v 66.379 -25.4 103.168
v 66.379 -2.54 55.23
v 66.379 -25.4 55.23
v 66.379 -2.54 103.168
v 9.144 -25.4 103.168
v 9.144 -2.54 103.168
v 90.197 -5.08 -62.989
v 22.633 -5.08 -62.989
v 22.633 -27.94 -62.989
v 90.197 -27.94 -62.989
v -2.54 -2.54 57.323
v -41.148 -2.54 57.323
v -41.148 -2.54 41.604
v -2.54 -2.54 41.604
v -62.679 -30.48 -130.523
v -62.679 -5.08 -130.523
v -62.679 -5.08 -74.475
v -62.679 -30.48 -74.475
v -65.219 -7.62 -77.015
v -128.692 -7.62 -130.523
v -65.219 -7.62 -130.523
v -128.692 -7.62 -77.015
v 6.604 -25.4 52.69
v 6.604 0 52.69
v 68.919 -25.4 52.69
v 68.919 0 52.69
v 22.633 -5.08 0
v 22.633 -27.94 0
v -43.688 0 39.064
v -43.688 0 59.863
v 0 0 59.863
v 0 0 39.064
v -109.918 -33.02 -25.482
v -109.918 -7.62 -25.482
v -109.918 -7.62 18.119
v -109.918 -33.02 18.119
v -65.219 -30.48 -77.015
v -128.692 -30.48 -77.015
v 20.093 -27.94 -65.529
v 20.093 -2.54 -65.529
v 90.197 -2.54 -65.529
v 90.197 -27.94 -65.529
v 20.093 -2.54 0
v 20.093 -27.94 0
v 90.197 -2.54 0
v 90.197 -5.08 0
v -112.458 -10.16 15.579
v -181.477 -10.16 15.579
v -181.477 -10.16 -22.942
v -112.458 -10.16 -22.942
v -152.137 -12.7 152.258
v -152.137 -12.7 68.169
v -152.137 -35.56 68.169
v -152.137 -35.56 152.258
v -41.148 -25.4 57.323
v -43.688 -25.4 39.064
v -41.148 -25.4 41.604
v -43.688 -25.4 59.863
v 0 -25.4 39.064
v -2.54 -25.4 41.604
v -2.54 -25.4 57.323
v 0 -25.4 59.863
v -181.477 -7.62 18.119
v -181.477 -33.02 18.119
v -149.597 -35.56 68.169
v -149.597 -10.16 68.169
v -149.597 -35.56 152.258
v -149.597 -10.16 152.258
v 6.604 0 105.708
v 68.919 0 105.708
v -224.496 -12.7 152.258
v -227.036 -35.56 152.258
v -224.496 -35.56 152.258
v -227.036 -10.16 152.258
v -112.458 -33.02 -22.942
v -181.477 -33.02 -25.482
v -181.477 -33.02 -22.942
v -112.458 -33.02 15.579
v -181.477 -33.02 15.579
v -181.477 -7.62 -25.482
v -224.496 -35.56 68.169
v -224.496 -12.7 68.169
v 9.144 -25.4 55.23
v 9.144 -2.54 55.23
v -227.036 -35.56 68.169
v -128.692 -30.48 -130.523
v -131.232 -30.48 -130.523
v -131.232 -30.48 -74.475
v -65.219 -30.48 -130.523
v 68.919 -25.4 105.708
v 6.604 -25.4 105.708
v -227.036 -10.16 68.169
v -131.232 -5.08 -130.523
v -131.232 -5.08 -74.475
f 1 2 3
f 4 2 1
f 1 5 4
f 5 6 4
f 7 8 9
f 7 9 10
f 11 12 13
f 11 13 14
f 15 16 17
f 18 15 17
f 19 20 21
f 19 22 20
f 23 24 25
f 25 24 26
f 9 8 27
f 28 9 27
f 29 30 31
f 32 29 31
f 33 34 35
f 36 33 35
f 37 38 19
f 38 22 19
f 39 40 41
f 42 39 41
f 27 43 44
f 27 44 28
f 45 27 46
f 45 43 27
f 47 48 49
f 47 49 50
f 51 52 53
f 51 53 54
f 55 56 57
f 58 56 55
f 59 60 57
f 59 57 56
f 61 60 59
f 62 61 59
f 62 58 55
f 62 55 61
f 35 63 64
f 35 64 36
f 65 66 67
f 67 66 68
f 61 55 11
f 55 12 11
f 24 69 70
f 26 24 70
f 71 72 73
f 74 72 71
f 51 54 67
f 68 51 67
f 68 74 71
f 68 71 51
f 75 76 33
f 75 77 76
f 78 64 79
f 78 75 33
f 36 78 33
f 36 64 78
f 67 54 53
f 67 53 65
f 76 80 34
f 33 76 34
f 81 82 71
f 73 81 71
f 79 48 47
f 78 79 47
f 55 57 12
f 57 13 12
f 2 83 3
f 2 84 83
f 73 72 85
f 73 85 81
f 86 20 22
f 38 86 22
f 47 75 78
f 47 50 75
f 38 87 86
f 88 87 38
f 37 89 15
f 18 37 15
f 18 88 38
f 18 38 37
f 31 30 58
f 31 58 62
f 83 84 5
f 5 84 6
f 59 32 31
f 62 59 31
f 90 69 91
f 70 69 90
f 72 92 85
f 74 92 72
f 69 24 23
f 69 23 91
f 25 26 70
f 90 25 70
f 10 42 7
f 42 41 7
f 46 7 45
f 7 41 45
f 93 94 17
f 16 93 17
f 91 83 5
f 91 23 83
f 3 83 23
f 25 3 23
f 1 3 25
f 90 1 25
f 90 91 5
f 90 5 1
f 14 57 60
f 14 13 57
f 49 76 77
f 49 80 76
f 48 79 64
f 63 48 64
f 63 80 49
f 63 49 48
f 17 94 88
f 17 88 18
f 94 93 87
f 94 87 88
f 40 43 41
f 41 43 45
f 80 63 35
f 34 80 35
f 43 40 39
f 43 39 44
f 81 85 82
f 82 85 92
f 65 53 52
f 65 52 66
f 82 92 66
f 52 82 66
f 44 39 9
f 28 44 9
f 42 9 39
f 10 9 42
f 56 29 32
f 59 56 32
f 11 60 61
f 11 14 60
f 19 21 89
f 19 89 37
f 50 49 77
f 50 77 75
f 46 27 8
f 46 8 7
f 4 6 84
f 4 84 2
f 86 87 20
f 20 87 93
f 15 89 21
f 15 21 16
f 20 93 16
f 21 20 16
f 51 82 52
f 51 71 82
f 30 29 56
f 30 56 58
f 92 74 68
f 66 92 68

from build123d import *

# Parameters (mm, degrees)
F0_W      = 43.6879917979
F0_H      = 20.799420774
F1_DEPTH  = 25.4
F0_W_2    = 62.3146742582
F0_H_2    = 53.0174635351
F11_T     = -2.54
F11_2_T   = -2.54
F2_W      = 70.1040774584
F2_H      = 65.5285418034
F3_DEPTH  = 25.4
F4_T      = -2.54
F5_W      = 68.5530081391
F5_H      = 56.0477301478
F6_DEPTH  = 25.4
F7_T      = -2.54
F8_W      = 71.5593323112
F8_H      = 43.6012223363
F12_DEPTH = 25.4
F13_T     = -2.54
F9_W      = 77.4390846491
F9_H      = 84.0891003609
F10_DEPTH = 25.4
F14_T     = -2.54


with BuildPart() as f1:
    # F0 (on Front) → F1 (new body)
    with BuildSketch(Plane.XZ):
        with Locations((-21.843995899, 49.4633279741)):
            Rectangle(F0_W, F0_H)
    extrude(amount=F1_DEPTH)

    # F11#2
    f11_2_openings = [f1.faces().sort_by_distance(p)[0] for p in [
        (-21.843996, -25.4, 49.463328),
    ]]
    offset(amount=F11_2_T, openings=f11_2_openings)


with BuildPart() as f1b:
    # F0 (on Front) → F1, piece 2 (new body)
    with BuildSketch(Plane.XZ):
        with Locations((37.7613380551, 79.1990179569)):
            Rectangle(F0_W_2, F0_H_2)
    extrude(amount=F1_DEPTH)

    # F11
    f11_openings = [f1b.faces().sort_by_distance(p)[0] for p in [
        (37.761338, -25.4, 79.199018),
    ]]
    offset(amount=F11_T, openings=f11_openings)


with BuildPart() as f3:
    # F2 (on face) → F3 (new body)
    with BuildSketch(Plane.XZ.offset(2.54)):
        with Locations((55.145137012, -32.7642709017)):
            Rectangle(F2_W, F2_H)
    extrude(amount=F3_DEPTH)

    # F4
    f4_openings = [f3.faces().sort_by_distance(p)[0] for p in [
        (90.197176, -15.24, -32.764271),
        (55.145137, -15.24, 0),
        (55.145137, -27.94, -32.764271),
    ]]
    offset(amount=F4_T, openings=f4_openings)


with BuildPart() as f6:
    # F5 (on face) → F6 (new body)
    with BuildSketch(Plane.XZ.offset(5.08)):
        with Locations((-96.9556830823, -102.499101311)):
            Rectangle(F5_W, F5_H)
    extrude(amount=F6_DEPTH)

    # F7
    f7_openings = [f6.faces().sort_by_distance(p)[0] for p in [
        (-96.955683, -30.48, -102.499101),
        (-96.955683, -17.78, -130.522966),
    ]]
    offset(amount=F7_T, openings=f7_openings)


with BuildPart() as f12:
    # F8 (on face) → F12 (new body)
    with BuildSketch(Plane.XZ.offset(7.62)):
        with Locations((-145.697388798, -3.6815740168)):
            Rectangle(F8_W, F8_H)
    extrude(amount=F12_DEPTH)

    # F13
    f13_openings = [f12.faces().sort_by_distance(p)[0] for p in [
        (-181.477055, -20.32, -3.681574),
        (-145.697389, -33.02, -3.681574),
    ]]
    offset(amount=F13_T, openings=f13_openings)


with BuildPart() as f10:
    # F9 (on face) → F10 (new body)
    with BuildSketch(Plane.XZ.offset(10.16)):
        with Locations((-188.3165761828, 110.2131158113)):
            Rectangle(F9_W, F9_H)
    extrude(amount=F10_DEPTH)

    # F14
    f14_openings = [f10.faces().sort_by_distance(p)[0] for p in [
        (-188.316576, -35.56, 110.213116),
        (-188.316576, -22.86, 68.168566),
        (-188.316576, -22.86, 152.257666),
    ]]
    offset(amount=F14_T, openings=f14_openings)


solid = Compound([f1.part, f1b.part, f3.part, f6.part, f12.part, f10.part])
